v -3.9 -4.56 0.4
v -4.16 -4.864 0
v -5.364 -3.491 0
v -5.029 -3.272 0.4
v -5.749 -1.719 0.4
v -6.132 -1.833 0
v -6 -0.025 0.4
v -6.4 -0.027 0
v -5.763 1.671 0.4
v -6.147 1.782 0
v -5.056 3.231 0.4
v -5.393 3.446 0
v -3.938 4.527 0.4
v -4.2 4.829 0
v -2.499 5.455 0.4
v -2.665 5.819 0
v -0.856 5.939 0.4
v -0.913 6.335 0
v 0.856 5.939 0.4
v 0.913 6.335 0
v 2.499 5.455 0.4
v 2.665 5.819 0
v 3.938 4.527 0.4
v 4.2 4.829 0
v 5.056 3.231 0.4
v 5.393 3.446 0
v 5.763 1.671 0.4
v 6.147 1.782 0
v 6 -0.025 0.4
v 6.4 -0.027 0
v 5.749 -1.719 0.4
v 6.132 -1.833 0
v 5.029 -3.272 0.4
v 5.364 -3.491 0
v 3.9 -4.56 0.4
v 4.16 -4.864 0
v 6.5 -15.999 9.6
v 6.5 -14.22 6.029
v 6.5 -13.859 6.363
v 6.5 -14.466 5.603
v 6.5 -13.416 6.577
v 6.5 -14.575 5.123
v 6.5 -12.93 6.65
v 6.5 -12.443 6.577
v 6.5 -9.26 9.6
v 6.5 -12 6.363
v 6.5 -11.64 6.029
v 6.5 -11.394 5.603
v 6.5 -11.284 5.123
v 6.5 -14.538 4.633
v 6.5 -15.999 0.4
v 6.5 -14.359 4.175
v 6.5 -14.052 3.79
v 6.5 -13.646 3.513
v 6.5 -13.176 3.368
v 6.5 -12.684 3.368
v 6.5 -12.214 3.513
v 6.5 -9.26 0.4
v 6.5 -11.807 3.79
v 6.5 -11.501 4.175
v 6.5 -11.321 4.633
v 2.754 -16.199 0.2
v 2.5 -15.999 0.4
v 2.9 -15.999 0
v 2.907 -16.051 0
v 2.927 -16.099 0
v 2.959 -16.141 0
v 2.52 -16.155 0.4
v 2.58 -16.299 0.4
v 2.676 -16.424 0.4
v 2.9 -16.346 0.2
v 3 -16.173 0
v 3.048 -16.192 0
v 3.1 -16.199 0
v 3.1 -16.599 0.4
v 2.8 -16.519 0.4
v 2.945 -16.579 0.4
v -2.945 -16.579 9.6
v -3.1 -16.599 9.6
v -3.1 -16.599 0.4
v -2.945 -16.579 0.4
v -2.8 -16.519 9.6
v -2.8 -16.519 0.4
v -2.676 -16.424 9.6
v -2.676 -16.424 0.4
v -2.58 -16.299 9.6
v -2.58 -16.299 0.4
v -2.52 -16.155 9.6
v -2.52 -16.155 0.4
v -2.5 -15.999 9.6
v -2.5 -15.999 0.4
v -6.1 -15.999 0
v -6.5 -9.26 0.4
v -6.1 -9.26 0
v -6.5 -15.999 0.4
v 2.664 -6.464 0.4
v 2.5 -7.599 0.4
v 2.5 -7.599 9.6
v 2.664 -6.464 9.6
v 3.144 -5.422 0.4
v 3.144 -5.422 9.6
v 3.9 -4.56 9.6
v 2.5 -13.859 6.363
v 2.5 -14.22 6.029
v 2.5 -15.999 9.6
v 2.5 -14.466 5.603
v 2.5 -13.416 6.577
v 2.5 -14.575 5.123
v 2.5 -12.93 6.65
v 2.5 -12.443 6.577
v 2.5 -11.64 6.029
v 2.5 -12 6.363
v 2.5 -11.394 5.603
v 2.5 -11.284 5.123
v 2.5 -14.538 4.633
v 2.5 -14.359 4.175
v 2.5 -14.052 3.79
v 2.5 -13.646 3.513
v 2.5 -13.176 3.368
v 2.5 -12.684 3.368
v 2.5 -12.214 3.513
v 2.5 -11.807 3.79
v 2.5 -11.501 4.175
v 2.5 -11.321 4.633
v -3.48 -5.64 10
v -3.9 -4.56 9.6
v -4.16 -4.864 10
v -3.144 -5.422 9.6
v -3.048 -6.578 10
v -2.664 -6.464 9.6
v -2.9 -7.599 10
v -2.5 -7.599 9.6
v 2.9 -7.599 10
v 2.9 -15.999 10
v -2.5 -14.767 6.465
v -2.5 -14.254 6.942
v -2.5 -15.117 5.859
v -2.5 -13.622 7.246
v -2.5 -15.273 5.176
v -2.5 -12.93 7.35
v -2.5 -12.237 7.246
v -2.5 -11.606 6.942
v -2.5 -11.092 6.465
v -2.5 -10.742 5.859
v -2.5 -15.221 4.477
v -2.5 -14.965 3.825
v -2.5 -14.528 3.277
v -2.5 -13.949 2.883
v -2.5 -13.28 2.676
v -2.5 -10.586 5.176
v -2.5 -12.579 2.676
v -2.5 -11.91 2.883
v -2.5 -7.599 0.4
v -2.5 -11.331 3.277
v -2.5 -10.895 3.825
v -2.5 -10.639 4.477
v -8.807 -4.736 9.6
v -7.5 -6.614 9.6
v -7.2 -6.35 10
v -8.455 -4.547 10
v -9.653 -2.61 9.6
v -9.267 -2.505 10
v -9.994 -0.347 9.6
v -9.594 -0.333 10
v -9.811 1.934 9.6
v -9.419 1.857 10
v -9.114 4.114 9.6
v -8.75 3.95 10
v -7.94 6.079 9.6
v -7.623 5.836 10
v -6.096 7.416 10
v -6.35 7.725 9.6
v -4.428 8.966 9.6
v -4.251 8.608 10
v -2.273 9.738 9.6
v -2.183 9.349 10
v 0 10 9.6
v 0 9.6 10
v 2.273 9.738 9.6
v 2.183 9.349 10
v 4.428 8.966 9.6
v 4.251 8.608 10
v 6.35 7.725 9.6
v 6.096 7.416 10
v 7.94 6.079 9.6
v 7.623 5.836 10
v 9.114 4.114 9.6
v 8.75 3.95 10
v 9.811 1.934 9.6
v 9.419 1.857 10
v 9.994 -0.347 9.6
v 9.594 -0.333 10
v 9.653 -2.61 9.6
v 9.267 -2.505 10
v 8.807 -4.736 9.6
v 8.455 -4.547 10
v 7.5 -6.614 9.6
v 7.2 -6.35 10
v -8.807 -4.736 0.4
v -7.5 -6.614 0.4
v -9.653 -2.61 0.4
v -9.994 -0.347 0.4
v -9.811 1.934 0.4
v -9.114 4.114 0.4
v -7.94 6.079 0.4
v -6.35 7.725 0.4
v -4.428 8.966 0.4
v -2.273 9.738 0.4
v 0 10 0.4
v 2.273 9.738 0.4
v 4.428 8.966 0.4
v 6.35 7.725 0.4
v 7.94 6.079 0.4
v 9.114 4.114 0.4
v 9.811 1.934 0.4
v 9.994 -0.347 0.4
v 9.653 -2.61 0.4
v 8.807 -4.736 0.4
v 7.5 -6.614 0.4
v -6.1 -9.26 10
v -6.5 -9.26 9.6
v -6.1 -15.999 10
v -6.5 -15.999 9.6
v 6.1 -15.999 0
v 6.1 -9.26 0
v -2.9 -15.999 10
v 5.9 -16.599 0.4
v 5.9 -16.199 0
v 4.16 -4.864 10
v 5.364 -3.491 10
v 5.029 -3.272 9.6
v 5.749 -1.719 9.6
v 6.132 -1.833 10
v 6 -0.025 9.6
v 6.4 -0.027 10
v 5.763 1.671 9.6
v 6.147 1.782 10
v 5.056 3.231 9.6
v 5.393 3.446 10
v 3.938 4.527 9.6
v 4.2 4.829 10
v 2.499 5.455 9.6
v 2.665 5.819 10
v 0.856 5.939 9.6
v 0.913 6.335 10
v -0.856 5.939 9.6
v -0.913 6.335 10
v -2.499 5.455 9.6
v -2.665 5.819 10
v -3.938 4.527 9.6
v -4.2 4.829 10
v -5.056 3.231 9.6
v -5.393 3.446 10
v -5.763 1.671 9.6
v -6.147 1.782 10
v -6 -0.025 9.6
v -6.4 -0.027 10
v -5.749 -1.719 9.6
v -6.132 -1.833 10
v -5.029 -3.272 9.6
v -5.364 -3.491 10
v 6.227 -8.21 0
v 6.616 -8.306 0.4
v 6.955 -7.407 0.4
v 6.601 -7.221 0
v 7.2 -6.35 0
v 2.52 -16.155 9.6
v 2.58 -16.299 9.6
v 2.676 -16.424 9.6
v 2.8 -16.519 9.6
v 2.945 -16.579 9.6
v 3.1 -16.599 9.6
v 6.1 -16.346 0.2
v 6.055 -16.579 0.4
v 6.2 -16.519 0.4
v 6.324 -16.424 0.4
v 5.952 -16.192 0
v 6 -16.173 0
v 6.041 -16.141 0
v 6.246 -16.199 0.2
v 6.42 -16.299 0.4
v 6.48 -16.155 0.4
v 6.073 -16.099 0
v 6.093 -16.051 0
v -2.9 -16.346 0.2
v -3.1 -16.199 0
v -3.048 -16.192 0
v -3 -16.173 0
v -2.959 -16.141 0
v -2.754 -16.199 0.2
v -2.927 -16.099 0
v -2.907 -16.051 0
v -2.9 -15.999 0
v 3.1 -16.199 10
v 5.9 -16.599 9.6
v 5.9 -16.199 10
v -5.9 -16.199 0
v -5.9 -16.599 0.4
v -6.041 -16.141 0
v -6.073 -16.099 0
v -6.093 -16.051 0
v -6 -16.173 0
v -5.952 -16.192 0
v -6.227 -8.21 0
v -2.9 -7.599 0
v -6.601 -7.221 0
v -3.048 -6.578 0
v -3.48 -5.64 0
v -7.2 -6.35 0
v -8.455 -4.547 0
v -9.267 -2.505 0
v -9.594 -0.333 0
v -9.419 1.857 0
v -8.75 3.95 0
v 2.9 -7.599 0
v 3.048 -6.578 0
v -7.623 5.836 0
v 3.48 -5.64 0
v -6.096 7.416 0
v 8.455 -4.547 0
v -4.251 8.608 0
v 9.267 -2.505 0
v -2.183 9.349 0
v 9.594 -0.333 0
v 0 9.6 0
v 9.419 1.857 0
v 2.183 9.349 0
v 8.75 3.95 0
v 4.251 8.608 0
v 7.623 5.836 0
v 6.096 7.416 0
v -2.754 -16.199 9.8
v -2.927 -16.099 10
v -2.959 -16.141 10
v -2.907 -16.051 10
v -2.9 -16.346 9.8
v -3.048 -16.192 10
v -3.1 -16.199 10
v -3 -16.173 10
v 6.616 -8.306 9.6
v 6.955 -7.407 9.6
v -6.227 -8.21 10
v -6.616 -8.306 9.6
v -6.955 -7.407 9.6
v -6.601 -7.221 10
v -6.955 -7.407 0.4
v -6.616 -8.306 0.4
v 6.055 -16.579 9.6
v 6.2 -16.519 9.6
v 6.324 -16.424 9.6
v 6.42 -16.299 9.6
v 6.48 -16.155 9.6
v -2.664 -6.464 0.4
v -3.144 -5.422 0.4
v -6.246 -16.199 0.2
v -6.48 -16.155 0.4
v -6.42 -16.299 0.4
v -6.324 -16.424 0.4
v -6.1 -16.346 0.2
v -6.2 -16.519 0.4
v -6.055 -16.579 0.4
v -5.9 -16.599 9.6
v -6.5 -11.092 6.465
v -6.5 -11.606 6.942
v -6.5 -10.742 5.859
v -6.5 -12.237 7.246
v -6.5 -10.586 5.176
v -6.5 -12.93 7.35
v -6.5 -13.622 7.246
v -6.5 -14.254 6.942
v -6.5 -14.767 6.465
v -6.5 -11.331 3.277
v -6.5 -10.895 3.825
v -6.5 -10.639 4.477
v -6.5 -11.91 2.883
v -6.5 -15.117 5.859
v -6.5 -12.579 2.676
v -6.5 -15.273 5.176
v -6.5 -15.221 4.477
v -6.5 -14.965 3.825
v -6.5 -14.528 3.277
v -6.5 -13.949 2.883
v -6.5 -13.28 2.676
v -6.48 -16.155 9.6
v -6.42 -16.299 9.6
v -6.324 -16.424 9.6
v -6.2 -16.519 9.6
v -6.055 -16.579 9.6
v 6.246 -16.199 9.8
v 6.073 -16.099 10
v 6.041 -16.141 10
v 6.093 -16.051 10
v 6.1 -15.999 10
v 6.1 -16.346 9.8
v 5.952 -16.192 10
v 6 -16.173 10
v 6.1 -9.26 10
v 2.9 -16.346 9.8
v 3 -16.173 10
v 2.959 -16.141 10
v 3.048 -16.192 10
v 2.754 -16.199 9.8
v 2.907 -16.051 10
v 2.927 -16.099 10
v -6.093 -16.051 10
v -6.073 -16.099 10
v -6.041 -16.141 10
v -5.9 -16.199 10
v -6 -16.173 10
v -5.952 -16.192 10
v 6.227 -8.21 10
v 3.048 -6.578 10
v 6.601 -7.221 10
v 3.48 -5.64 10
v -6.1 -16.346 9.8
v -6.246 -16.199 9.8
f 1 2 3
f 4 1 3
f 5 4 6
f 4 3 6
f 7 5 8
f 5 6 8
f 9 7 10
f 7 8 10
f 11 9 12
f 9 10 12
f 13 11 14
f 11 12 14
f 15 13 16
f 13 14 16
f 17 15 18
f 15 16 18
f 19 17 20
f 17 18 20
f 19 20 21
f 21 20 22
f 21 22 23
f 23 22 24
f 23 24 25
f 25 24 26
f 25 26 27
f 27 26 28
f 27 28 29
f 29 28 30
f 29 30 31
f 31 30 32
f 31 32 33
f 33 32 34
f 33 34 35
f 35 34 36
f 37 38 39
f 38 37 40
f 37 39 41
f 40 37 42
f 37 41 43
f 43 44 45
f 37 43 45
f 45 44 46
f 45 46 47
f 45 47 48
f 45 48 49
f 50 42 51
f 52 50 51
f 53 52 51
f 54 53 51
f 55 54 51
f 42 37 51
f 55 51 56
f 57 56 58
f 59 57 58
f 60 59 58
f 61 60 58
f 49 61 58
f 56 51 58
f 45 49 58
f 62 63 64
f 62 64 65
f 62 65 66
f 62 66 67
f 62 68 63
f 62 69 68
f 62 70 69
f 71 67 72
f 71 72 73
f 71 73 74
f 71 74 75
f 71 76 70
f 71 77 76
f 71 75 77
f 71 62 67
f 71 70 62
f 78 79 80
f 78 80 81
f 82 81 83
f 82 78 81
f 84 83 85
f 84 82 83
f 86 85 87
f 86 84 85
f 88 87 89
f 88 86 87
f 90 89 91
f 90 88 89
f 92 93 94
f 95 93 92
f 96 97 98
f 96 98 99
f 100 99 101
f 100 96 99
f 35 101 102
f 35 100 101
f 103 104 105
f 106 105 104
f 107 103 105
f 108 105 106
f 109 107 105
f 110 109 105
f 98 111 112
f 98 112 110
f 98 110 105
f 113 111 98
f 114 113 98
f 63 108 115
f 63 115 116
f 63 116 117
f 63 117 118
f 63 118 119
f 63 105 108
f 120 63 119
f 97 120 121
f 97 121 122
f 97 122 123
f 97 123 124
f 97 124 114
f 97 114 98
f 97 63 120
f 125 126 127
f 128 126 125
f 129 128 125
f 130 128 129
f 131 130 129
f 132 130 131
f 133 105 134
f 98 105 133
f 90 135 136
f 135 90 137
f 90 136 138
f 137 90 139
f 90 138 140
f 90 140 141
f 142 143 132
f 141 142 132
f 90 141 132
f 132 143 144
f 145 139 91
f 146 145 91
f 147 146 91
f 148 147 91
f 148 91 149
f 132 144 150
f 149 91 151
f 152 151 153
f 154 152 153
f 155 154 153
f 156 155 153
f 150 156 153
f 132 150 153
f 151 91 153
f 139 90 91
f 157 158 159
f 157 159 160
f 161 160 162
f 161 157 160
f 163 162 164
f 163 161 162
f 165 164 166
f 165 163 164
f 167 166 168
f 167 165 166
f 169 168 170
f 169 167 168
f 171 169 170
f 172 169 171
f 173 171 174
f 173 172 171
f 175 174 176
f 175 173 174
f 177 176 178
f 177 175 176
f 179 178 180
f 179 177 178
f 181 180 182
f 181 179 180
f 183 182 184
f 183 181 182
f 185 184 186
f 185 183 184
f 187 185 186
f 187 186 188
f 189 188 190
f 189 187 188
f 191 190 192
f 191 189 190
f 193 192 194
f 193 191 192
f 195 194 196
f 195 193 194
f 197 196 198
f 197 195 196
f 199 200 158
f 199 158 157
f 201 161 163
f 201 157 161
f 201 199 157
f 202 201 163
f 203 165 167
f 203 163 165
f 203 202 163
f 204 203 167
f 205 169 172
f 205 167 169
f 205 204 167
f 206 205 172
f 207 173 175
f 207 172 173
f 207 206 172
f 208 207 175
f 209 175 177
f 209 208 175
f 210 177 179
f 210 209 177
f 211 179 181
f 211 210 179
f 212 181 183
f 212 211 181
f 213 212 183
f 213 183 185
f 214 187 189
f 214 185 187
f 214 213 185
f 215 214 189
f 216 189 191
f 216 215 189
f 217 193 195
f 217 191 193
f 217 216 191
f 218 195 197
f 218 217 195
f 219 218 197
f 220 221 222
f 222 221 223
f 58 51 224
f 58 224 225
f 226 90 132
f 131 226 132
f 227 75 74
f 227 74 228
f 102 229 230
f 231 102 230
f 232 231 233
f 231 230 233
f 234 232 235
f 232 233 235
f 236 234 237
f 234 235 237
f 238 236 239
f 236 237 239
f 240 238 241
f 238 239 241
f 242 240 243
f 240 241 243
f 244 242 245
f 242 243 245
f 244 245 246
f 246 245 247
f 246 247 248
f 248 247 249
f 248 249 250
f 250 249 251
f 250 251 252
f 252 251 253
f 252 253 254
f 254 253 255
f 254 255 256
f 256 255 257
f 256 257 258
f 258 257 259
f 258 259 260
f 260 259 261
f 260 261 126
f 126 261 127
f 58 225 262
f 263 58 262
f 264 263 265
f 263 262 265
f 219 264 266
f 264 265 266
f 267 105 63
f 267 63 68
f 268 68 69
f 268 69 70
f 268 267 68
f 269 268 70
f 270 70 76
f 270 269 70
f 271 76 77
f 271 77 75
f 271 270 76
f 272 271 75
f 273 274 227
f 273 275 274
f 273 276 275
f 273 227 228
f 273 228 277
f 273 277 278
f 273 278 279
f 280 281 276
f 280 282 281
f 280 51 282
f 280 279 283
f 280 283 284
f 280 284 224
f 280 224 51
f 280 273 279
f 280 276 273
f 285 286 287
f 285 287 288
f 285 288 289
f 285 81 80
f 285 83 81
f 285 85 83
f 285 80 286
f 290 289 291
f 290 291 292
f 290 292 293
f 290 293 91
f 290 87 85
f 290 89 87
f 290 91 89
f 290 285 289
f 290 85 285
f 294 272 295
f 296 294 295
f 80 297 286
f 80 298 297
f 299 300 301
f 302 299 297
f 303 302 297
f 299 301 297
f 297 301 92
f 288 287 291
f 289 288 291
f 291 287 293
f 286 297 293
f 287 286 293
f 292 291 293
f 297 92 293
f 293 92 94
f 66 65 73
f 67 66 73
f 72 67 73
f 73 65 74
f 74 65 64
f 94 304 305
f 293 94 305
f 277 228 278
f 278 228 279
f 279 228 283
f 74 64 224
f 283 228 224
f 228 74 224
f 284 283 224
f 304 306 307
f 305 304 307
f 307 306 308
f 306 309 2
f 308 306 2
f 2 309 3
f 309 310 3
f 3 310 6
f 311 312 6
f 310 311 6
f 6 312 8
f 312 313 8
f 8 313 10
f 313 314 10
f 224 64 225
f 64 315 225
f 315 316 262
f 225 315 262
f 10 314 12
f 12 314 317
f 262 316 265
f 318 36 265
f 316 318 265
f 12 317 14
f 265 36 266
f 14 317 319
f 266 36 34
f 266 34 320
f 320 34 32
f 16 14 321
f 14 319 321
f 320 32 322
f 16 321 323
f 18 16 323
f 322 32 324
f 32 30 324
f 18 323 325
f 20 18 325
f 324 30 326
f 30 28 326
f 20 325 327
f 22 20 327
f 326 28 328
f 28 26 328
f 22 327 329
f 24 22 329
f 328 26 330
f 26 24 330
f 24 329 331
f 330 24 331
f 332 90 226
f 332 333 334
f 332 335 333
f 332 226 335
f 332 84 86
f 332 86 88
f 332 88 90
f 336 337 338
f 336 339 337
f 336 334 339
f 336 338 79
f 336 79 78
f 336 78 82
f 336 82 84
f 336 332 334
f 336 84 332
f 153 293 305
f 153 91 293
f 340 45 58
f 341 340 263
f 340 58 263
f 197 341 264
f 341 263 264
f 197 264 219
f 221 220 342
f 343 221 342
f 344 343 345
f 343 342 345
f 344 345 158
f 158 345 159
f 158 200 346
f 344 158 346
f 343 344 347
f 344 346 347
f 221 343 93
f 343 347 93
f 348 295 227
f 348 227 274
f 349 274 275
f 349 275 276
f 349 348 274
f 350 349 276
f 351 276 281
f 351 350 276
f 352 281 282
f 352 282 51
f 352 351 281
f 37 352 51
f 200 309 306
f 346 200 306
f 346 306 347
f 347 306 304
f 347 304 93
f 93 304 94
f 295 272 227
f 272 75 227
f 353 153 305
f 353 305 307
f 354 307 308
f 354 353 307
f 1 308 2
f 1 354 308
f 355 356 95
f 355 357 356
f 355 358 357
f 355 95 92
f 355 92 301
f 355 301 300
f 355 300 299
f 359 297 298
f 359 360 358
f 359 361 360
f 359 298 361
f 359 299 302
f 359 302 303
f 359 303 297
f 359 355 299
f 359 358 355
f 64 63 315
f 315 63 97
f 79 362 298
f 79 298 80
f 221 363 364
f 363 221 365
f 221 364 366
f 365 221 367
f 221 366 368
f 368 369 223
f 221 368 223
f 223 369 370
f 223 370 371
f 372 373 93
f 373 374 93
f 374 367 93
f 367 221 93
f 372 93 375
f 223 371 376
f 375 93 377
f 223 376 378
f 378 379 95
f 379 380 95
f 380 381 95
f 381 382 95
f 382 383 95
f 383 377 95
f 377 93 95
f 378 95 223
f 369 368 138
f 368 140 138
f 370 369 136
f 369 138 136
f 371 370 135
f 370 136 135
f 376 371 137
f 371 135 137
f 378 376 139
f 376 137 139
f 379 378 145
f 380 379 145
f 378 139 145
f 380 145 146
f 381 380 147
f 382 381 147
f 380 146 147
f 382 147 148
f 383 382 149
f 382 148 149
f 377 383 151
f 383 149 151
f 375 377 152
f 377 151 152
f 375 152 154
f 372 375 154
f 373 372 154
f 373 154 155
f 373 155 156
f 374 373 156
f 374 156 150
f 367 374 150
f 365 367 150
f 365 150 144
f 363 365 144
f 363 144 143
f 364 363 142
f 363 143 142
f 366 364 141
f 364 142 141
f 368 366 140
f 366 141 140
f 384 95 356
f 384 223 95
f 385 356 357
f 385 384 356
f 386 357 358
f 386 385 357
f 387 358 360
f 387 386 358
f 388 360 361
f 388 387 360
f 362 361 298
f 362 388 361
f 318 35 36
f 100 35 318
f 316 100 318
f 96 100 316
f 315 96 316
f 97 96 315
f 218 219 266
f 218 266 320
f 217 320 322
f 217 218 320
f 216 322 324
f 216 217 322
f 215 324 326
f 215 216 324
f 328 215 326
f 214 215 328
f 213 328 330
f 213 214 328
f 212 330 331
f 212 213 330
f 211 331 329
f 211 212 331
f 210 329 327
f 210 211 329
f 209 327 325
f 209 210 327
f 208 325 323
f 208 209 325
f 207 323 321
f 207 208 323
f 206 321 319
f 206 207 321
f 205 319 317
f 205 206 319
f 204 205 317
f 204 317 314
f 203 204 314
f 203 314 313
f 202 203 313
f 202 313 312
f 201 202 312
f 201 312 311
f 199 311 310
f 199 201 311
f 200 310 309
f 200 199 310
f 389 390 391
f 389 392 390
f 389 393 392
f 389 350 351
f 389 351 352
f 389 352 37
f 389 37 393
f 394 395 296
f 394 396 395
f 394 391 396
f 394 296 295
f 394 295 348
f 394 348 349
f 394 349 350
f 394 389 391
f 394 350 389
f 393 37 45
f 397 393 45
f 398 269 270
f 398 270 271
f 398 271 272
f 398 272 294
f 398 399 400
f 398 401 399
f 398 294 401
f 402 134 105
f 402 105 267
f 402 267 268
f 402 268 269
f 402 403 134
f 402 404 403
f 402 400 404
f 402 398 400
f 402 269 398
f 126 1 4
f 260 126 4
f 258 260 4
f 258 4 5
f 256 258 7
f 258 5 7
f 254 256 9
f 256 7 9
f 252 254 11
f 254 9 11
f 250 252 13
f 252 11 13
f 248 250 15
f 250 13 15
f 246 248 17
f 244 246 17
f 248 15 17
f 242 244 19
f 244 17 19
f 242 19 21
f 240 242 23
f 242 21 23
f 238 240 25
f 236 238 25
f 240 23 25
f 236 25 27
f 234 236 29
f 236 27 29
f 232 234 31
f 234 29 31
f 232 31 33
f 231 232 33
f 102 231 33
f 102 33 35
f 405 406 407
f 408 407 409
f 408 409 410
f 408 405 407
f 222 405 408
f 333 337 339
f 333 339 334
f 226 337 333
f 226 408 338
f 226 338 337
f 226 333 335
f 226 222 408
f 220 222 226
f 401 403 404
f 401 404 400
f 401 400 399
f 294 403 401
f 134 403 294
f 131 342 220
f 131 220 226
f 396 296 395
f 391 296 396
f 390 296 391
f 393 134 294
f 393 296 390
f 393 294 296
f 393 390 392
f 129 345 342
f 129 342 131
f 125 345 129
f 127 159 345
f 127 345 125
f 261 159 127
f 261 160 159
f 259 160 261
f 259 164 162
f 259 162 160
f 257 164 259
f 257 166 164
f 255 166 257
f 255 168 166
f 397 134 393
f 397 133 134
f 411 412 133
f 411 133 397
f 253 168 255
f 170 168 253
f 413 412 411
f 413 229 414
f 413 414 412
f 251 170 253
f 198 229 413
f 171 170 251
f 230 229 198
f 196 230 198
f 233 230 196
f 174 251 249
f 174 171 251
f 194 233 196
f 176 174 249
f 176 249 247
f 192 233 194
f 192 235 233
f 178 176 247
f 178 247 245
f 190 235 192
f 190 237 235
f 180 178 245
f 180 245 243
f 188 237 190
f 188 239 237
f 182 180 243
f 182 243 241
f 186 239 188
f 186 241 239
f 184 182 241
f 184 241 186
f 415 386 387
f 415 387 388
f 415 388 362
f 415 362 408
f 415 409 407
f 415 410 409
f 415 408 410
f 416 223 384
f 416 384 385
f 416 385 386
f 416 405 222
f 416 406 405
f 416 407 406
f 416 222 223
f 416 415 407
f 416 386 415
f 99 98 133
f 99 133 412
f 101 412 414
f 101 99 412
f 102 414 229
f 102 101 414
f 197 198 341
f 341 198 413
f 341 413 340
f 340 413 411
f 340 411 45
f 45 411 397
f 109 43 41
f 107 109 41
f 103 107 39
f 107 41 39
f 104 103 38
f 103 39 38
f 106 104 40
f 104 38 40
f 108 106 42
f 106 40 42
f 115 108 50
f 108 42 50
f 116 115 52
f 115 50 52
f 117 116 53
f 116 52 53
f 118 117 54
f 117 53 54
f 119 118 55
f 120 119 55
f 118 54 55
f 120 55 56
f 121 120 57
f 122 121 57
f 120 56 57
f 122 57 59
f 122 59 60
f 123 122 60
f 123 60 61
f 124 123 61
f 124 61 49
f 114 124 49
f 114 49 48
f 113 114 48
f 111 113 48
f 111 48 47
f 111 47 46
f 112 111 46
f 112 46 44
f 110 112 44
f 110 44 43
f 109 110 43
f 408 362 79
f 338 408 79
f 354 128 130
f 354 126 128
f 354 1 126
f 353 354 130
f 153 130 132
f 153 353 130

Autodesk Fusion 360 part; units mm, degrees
sketch "air pipe clamp base" plane through (0, 0, 0) normal (0, 0, 1) x (1, 0, 0)
  line L0 (-6.5, -9.2601) -> (-6.5, -16.5993)
  line L1 (-6.5, -16.5993) -> (-2.5, -16.5993)
  line L2 (2.5, -16.5993) -> (6.5, -16.5993)
  line L3 (6.5, -16.5993) -> (6.5, -9.2601)
  line L4 (-2.5, -16.5993) -> (-2.5, -7.5993)
  line L5 (2.5, -16.5993) -> (2.5, -7.5993)
  arc A0 (7.5, -6.6144) -> (-7.5, -6.6144) centre (0, 0) ccw
  arc A1 (3.9, -4.5596) -> (-3.9, -4.5596) centre (0, 0) ccw
  line L6 (0, 0) -> (0, -19.8599) construction
  arc A2 (-2.5, -7.5993) -> (-3.9, -4.5596) centre (-6.5, -7.5993) ccw
  arc A3 (3.9, -4.5596) -> (2.5, -7.5993) centre (6.5, -7.5993) ccw
  arc A4 (-6.5, -9.2601) -> (-7.5, -6.6144) centre (-10.5, -9.2601) ccw
  arc A5 (7.5, -6.6144) -> (6.5, -9.2601) centre (10.5, -9.2601) ccw
  point P0 (-6.5, -7.5993)
  dimension "d1" = 12
  dimension "d3" = 4
  dimension "d4" = 5
  dimension "d5" = 4
  dimension "d6" = 4
  dimension "d7" = 9
  dimension "d8" = 4
extrude "Extrude1" add sketch "air pipe clamp base" along normal blind 10
sketch "screw holes" plane through (-6.5, 0, 0) normal (-1, 0, 0) x (0, 0, 1)
  line L0 (0, -9.2601) -> (0, -16.5993)
  line L1 (0, -16.5993) -> (10, -16.5993)
  line L2 (10, -16.5993) -> (10, -9.2601)
  line L3 (10, -9.2601) -> (0, -9.2601)
  line L4 (0, -9.2601) -> (10, -16.5993) construction
  line L5 (10, -9.2601) -> (0, -16.5993) construction
  point P0 (5, -12.9297)
hole "Hole1" at (-6.5, -12.9297, 5) direction (1, 0, 0) diameter 4.7 depth 5 tip angle 180
hole "Hole2" at (-6.5, -12.9297, 5) direction (1, 0, 0) diameter 3.3 depth 25 tip angle 180
fillet "Fillet1" radius 0.6 4 edges at (-6.5, -16.5993, 5) (-2.5, -16.5993, 5) (2.5, -16.5993, 5) (6.5, -16.5993, 5)
chamfer "Chamfer1" distance 0.4 angle 45 2 faces at (-3.8333, -10.9529, 10) (-3.8333, -10.9529, 0)
